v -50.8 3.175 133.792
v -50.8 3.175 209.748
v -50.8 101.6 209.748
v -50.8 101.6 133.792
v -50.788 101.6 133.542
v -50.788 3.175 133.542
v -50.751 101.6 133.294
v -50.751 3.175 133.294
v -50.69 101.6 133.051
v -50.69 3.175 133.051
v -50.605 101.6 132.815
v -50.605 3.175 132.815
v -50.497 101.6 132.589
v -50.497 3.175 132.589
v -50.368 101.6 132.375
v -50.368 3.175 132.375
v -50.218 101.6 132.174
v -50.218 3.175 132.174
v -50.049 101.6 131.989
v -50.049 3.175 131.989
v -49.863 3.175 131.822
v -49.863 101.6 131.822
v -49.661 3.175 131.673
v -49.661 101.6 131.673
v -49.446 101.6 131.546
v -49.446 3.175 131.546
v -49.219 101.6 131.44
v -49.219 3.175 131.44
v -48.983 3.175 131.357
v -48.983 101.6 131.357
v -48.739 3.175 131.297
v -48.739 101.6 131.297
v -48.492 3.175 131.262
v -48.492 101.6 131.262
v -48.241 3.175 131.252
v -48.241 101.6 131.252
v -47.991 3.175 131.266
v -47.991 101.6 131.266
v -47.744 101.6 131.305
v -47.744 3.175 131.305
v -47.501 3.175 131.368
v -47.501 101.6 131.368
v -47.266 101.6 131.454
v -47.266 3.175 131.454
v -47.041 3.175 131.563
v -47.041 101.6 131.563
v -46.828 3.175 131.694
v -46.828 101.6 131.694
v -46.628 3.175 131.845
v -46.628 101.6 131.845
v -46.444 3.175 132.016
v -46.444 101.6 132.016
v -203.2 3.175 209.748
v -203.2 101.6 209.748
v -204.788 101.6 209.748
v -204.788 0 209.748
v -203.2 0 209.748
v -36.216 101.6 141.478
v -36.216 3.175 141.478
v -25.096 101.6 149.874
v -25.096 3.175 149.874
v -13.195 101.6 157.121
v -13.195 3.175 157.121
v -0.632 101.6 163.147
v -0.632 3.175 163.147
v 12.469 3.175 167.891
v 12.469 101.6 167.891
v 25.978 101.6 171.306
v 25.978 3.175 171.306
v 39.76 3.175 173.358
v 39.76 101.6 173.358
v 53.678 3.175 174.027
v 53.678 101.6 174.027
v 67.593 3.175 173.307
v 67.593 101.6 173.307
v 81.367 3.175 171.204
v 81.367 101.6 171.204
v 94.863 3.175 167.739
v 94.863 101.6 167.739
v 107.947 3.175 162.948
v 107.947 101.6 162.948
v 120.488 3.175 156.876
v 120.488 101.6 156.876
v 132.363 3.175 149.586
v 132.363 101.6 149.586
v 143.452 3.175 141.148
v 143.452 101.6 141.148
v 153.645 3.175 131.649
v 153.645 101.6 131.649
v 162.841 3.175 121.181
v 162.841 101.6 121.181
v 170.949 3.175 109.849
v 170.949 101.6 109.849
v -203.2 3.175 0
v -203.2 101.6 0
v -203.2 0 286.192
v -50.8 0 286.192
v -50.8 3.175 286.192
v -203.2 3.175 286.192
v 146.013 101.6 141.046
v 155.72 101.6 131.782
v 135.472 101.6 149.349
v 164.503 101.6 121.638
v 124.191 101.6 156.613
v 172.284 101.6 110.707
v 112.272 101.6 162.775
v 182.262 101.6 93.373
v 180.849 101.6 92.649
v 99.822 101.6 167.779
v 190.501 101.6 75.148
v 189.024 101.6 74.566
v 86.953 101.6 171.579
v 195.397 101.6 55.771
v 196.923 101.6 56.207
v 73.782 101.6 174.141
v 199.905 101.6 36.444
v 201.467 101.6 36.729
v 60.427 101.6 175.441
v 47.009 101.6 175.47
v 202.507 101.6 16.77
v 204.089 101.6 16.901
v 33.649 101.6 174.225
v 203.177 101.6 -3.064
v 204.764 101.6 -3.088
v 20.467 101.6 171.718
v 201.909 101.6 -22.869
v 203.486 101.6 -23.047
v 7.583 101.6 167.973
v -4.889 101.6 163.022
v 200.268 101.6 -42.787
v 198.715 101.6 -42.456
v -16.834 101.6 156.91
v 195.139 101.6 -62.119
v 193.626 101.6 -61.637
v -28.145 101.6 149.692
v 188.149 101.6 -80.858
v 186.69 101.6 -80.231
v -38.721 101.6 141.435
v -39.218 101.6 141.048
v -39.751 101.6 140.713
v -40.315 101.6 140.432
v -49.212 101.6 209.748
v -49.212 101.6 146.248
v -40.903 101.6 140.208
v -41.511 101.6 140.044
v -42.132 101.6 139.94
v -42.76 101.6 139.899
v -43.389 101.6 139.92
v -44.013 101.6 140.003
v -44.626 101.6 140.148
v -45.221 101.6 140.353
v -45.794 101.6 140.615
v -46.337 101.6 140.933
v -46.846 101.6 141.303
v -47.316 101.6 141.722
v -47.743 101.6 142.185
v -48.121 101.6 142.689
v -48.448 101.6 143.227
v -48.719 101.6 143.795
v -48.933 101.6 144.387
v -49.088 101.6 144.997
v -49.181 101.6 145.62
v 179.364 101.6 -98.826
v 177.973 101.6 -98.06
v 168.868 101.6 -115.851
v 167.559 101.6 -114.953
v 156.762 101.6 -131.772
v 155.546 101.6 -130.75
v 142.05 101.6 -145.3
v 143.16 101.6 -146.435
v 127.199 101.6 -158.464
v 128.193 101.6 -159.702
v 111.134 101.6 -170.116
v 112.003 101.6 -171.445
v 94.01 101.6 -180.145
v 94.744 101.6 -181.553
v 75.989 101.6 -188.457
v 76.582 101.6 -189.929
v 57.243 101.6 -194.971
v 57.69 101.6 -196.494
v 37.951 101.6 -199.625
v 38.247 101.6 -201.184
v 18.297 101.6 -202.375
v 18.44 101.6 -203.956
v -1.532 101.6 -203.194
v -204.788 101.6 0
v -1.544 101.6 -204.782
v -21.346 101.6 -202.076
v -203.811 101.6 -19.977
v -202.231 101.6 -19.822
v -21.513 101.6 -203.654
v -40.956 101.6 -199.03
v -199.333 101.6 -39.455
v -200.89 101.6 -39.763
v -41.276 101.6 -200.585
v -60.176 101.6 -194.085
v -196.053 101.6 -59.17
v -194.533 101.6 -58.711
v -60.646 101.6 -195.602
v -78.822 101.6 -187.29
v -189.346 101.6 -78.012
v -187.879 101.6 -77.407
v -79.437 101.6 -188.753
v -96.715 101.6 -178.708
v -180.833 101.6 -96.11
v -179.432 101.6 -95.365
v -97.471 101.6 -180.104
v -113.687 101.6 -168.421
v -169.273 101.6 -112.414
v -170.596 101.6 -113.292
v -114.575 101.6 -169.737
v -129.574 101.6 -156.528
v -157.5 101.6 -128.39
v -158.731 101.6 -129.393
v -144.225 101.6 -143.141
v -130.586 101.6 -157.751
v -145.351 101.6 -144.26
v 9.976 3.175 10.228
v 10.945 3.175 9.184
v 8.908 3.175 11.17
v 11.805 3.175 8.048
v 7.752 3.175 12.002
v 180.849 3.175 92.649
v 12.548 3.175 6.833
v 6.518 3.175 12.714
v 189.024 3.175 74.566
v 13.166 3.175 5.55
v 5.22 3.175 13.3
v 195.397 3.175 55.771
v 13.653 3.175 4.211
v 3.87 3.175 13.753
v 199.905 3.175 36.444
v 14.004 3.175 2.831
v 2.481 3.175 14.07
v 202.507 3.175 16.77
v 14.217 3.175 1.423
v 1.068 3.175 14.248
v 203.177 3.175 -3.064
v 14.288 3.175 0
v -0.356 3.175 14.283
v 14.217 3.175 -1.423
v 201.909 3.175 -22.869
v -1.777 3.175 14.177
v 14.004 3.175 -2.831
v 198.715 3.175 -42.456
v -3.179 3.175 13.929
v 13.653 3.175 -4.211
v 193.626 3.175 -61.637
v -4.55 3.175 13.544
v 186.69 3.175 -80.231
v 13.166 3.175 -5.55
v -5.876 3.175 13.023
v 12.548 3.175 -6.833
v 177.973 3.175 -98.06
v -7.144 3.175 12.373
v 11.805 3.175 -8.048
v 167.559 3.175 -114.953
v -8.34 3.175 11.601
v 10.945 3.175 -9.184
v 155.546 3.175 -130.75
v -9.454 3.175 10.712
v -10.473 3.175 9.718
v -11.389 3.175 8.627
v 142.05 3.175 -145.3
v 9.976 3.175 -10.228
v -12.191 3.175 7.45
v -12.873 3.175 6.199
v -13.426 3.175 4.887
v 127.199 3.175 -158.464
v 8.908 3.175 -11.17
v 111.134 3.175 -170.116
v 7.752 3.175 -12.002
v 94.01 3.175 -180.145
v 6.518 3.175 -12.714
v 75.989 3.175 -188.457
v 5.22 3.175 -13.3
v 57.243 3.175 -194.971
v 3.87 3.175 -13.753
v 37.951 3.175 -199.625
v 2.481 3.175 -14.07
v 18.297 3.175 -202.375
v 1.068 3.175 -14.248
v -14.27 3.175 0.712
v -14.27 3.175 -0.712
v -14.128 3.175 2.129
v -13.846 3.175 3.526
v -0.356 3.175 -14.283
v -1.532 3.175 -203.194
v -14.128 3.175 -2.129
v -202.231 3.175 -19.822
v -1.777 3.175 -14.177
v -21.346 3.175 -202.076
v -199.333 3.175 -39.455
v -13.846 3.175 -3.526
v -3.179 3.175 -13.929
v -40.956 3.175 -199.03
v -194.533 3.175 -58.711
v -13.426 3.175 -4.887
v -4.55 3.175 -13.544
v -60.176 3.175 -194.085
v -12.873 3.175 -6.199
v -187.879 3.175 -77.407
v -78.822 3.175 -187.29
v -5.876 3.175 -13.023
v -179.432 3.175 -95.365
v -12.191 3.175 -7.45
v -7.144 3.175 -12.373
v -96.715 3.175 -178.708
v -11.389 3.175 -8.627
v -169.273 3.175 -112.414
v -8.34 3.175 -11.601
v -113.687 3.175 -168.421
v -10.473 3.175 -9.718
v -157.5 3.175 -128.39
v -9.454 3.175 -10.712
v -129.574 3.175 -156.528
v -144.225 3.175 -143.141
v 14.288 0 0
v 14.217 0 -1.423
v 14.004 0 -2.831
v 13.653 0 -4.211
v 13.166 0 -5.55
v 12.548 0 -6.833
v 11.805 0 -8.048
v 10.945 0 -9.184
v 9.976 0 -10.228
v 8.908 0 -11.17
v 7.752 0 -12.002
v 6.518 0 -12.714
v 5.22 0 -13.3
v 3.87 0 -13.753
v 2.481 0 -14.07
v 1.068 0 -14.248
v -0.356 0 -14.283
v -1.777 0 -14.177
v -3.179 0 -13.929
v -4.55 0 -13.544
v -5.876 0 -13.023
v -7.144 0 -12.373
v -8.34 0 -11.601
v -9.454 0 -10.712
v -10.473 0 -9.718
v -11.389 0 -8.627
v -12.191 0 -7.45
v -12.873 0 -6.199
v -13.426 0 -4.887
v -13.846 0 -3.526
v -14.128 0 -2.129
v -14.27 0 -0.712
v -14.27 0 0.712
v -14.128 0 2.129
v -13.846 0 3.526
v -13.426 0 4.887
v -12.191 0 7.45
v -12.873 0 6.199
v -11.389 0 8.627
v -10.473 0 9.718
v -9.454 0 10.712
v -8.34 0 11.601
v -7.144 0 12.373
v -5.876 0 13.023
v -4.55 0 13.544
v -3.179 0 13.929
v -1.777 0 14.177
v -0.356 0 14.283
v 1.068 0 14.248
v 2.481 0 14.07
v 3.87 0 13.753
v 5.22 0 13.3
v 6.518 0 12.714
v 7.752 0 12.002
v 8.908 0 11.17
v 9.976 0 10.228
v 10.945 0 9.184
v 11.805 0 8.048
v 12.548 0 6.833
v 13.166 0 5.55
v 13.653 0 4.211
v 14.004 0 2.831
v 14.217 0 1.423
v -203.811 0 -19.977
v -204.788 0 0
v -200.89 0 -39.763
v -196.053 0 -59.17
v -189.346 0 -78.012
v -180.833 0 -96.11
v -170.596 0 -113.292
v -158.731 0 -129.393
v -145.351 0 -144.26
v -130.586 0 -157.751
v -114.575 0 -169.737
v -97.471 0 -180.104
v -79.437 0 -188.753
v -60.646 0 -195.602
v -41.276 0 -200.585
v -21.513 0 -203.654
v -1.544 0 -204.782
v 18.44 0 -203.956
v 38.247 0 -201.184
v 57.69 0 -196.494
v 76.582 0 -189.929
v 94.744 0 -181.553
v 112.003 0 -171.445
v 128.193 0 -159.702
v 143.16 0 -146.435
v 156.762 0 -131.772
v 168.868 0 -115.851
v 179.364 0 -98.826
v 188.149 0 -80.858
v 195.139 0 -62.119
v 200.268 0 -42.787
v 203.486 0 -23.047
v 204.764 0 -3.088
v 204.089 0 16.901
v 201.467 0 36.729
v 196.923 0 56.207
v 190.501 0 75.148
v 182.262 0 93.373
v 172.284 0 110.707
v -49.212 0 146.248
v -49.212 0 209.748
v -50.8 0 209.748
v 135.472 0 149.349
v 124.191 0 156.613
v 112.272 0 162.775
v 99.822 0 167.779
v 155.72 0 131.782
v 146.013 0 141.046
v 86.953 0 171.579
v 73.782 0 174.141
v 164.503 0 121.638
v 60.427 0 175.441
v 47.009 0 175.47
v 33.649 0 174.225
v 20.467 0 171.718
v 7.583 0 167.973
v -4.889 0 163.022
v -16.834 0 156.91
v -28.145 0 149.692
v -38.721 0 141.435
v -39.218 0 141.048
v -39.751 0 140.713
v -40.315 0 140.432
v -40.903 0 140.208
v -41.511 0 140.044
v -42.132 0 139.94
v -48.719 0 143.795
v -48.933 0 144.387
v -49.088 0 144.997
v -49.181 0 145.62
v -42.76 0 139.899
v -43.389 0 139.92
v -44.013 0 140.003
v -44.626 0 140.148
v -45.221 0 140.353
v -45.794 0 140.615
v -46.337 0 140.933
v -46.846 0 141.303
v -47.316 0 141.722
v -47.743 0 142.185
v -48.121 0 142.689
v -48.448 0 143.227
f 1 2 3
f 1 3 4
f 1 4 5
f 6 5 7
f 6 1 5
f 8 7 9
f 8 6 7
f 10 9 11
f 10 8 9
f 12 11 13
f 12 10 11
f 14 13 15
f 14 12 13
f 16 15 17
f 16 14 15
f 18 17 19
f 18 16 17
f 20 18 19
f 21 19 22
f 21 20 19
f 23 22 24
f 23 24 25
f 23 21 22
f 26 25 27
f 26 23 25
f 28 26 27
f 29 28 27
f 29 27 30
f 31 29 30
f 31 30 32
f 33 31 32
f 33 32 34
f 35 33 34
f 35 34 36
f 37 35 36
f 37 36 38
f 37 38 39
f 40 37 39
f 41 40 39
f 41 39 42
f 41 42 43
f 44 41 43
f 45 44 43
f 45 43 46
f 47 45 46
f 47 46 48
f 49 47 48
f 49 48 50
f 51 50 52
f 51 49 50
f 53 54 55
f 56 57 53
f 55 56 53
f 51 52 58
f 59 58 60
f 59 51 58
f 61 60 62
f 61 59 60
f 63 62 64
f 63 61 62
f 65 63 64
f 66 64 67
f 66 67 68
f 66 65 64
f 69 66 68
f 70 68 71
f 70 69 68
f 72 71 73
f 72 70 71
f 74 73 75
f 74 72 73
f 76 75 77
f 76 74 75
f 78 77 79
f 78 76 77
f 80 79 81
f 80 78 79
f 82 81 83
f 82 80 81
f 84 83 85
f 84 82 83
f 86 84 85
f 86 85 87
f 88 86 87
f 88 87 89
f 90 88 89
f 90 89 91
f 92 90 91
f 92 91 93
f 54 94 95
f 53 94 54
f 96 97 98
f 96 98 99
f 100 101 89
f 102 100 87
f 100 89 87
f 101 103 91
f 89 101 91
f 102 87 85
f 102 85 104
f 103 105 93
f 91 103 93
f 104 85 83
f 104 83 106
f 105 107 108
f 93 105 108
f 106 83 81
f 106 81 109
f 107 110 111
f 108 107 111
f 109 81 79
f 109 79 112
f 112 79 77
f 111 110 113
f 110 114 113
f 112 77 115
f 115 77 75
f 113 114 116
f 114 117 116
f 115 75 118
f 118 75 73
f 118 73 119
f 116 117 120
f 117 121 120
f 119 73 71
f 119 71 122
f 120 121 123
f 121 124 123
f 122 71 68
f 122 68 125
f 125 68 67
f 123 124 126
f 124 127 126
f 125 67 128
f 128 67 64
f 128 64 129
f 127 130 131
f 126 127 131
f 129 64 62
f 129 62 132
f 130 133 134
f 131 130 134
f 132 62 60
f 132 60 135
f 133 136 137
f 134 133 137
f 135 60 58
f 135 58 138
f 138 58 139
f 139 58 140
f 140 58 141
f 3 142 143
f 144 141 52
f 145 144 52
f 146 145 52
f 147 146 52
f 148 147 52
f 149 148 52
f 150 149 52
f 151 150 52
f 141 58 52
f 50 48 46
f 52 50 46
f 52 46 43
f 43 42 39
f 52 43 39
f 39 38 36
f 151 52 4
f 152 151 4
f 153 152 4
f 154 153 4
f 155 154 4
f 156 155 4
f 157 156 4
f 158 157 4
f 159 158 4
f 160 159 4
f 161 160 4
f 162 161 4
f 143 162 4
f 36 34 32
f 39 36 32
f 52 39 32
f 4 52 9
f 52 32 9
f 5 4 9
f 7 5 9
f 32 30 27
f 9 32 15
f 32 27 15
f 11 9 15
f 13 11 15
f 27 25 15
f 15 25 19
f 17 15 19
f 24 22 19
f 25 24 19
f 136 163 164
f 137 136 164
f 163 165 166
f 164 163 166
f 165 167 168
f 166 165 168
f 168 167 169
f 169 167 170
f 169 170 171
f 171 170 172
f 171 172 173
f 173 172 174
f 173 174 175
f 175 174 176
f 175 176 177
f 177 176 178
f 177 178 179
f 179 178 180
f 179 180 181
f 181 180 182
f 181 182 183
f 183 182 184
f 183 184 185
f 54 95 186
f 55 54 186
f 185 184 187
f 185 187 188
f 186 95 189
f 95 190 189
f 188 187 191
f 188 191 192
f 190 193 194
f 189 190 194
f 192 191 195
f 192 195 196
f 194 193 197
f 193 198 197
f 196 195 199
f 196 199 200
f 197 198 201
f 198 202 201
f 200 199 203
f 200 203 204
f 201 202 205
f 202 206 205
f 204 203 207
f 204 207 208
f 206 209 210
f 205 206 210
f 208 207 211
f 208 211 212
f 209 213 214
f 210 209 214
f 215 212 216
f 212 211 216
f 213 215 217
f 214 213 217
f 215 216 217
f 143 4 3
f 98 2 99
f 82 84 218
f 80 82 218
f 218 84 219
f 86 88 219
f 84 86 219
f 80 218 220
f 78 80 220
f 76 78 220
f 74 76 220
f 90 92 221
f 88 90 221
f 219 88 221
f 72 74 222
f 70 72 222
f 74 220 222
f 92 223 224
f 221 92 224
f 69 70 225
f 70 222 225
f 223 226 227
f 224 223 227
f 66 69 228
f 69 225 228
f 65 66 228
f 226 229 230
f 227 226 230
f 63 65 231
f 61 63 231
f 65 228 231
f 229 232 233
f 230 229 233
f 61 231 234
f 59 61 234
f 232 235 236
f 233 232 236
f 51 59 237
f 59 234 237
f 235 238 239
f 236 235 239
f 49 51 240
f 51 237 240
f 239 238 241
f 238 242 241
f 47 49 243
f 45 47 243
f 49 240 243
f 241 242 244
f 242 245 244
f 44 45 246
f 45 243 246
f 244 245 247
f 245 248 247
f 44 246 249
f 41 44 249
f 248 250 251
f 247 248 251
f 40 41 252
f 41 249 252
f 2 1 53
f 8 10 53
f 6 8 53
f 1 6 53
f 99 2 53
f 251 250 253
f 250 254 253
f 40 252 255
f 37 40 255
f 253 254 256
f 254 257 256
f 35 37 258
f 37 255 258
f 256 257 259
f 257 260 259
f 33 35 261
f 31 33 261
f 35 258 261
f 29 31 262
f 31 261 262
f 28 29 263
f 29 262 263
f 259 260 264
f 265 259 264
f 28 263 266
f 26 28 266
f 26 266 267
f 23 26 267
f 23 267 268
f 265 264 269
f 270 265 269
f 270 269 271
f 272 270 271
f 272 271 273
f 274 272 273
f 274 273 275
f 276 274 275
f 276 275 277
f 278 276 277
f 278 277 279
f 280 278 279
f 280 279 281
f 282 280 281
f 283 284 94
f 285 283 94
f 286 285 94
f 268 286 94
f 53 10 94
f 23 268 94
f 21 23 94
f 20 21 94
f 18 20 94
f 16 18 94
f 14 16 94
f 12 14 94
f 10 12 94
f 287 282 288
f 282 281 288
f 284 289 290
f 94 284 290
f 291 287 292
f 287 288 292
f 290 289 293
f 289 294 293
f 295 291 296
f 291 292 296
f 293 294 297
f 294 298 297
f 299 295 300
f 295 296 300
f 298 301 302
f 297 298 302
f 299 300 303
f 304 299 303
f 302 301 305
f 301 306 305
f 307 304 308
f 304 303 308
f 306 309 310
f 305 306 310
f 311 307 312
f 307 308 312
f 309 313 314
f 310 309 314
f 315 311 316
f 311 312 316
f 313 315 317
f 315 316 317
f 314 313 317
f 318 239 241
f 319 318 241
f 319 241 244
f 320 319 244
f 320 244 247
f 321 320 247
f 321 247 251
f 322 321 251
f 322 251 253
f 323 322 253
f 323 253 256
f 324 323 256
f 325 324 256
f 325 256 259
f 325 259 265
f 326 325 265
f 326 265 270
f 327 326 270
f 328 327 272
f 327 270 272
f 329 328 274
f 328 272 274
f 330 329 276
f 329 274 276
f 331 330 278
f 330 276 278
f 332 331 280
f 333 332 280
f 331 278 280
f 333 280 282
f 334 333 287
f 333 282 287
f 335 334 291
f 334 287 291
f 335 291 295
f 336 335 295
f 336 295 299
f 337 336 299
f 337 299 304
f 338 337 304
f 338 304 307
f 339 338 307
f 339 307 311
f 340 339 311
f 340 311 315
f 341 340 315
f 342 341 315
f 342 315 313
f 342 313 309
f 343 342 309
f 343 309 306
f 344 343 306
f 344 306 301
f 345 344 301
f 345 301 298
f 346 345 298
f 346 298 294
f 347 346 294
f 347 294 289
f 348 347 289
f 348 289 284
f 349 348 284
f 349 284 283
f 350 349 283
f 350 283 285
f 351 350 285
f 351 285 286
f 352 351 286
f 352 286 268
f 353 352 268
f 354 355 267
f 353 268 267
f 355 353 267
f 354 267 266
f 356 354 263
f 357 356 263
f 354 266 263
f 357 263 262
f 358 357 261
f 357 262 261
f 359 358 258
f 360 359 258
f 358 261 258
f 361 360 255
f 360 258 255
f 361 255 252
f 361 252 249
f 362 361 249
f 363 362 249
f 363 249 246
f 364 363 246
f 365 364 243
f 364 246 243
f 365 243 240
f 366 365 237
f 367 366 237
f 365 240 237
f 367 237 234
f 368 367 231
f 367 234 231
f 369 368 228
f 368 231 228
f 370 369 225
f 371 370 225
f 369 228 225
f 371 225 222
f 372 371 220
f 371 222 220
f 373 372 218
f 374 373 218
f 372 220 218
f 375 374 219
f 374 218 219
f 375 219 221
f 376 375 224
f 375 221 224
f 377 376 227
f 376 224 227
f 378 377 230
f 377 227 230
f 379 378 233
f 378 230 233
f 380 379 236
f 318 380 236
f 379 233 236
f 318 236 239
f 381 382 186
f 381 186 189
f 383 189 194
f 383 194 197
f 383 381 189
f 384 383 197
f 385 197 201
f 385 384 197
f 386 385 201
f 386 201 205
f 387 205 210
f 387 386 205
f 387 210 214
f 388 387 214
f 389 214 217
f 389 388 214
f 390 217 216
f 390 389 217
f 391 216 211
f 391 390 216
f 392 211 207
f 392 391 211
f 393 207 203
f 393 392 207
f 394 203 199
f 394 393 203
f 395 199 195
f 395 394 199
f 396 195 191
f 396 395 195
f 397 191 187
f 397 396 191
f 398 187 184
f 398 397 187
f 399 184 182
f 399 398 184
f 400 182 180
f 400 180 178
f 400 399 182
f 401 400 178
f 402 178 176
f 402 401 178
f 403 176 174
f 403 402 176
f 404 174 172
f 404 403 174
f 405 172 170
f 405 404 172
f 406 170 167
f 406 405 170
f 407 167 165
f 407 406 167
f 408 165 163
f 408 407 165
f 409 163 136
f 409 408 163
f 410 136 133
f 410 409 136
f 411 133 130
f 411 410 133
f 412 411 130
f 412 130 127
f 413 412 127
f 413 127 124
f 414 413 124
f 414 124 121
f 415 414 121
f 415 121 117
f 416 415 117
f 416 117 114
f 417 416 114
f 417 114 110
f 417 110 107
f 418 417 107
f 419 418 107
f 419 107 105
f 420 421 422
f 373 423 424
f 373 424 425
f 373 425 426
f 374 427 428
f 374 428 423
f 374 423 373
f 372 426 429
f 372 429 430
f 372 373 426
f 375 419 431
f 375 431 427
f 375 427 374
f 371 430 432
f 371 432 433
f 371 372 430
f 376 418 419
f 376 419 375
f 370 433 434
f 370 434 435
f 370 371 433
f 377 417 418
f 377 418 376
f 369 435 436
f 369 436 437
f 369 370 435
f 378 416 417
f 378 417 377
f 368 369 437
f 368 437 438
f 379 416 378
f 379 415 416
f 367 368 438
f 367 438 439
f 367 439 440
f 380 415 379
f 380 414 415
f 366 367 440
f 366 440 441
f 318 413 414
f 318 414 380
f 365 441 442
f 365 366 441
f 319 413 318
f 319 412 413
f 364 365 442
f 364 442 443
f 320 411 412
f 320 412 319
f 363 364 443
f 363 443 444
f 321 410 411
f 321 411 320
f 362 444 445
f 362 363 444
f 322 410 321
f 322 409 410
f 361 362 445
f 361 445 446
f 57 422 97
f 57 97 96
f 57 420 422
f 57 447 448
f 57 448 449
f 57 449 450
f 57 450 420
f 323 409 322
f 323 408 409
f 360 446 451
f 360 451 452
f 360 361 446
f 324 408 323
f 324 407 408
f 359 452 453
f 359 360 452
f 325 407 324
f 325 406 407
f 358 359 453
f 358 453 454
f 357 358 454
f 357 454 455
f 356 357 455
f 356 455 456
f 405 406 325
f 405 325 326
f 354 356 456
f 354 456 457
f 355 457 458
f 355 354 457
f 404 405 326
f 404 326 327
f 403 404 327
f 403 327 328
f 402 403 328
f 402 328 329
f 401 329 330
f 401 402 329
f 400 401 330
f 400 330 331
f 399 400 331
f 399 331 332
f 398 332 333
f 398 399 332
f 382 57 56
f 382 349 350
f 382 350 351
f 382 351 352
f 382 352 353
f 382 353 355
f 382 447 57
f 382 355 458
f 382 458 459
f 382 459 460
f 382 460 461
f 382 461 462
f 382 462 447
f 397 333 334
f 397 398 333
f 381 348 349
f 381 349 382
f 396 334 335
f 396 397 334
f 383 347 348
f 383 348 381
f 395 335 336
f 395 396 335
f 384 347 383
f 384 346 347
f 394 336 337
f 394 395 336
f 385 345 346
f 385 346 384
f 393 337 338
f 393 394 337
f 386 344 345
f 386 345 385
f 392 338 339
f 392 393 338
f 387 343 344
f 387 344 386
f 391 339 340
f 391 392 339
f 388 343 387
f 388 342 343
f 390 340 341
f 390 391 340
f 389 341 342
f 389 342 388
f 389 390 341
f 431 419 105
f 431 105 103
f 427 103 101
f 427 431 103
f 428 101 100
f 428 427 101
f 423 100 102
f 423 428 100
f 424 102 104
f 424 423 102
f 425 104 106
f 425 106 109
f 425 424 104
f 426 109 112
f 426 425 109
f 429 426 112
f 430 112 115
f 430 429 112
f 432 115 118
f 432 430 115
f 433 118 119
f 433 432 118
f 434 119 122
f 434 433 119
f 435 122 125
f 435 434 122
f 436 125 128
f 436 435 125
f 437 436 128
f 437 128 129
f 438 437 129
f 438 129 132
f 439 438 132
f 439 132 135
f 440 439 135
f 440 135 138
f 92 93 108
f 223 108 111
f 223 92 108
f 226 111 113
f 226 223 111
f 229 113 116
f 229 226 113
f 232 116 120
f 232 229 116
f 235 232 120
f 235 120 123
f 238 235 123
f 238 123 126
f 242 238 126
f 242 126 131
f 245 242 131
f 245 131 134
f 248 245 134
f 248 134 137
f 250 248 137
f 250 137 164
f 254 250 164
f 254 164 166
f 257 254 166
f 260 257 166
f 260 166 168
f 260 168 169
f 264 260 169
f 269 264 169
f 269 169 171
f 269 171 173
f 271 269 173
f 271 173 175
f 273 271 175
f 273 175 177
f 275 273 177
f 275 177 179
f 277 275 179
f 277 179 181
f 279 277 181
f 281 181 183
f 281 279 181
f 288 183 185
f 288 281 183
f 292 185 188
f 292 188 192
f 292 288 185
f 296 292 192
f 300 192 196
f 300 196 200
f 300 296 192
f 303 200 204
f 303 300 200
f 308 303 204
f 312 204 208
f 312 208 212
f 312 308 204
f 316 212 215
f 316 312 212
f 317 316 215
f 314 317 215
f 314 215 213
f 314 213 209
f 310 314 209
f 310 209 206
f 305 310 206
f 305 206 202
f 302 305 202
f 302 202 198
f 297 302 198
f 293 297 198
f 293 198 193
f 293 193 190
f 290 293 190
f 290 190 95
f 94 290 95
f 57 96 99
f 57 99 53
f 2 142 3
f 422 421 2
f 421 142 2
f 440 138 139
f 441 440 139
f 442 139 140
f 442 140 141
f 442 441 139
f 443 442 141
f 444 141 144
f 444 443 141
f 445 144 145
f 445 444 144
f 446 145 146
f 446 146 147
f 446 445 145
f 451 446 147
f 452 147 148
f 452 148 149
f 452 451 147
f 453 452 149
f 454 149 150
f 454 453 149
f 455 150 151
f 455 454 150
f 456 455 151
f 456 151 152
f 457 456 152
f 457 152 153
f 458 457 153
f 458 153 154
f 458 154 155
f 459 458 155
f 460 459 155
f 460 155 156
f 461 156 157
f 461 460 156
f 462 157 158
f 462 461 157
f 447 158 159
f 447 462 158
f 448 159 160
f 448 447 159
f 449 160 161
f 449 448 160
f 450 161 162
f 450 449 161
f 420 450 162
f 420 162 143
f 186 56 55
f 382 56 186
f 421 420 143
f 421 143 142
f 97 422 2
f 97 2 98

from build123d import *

# Parameters (mm, degrees)
BOSS_EXTRUDE1_DEPTH = 101.6
BOSS_EXTRUDE2_DEPTH = 3.175
SKETCH3_R           = 14.2875
CUT_EXTRUDE1_DEPTH  = 4.175


with BuildPart() as part:
    # Sketch1 → Boss-Extrude1 (new body)
    with BuildSketch(Plane(origin=(0, 0, 0), x_dir=(1, 0, 0), z_dir=(0, 1, 0))):
        with BuildLine():
            Line((-203.2, 0), (-203.2, -209.748302875))
            Line((-203.2, -209.748302875), (-204.7875, -209.748302875))
            Line((-204.7875, -209.748302875), (-204.7875, 0))
            ThreePointArc((-204.7875, 0), (57.689818519, 196.493778516), (172.284391551, -110.706858794))
            ThreePointArc((172.284391551, -110.706858794), (73.781728286, -174.14050958), (-38.721251967, -141.434513854))
            ThreePointArc((-38.721251967, -141.434513854), (-45.510666818, -140.476846169), (-49.2125, -146.248302875))
            Line((-49.2125, -146.248302875), (-49.2125, -209.748302875))
            Line((-49.2125, -209.748302875), (-50.8, -209.748302875))
            Line((-50.8, -209.748302875), (-50.8, -196.747553987))
            Line((-50.8, -196.747553987), (-50.8, -133.791705405))
            ThreePointArc((-50.8, -133.791705405), (-49.219066452, -131.439729313), (-46.444258629, -132.015562597))
            ThreePointArc((-46.444258629, -132.015562597), (67.592808645, -173.307075278), (170.948853632, -109.848666091))
            ThreePointArc((170.948853632, -109.848666091), (57.242610623, 194.970570931), (-203.2, 0))
        make_face()
    extrude(amount=BOSS_EXTRUDE1_DEPTH)

    # Sketch2 → Boss-Extrude2 (add)
    with BuildSketch(Plane(origin=(0, 0, 0), x_dir=(1, 0, 0), z_dir=(0, 1, 0))):
        with BuildLine():
            Line((-50.8, -133.791705405), (-50.8, -286.191705405))
            Line((-50.8, -286.191705405), (-203.2, -286.191705405))
            Line((-203.2, -286.191705405), (-203.2, 0))
            ThreePointArc((-203.2, 0), (57.242610623, 194.970570931), (170.948853632, -109.848666091))
            ThreePointArc((170.948853632, -109.848666091), (67.592808645, -173.307075278), (-46.444258629, -132.015562597))
            ThreePointArc((-46.444258629, -132.015562597), (-49.219066452, -131.439729313), (-50.8, -133.791705405))
        make_face()
    extrude(amount=BOSS_EXTRUDE2_DEPTH)

    # Sketch3 → Cut-Extrude1 (cut, through all)
    with BuildSketch(Plane(origin=(0, 3.175, 0), x_dir=(1, 0, 0), z_dir=(0, 1, 0))):
        Circle(SKETCH3_R)
    extrude(amount=-CUT_EXTRUDE1_DEPTH, mode=Mode.SUBTRACT)


solid = part.part
